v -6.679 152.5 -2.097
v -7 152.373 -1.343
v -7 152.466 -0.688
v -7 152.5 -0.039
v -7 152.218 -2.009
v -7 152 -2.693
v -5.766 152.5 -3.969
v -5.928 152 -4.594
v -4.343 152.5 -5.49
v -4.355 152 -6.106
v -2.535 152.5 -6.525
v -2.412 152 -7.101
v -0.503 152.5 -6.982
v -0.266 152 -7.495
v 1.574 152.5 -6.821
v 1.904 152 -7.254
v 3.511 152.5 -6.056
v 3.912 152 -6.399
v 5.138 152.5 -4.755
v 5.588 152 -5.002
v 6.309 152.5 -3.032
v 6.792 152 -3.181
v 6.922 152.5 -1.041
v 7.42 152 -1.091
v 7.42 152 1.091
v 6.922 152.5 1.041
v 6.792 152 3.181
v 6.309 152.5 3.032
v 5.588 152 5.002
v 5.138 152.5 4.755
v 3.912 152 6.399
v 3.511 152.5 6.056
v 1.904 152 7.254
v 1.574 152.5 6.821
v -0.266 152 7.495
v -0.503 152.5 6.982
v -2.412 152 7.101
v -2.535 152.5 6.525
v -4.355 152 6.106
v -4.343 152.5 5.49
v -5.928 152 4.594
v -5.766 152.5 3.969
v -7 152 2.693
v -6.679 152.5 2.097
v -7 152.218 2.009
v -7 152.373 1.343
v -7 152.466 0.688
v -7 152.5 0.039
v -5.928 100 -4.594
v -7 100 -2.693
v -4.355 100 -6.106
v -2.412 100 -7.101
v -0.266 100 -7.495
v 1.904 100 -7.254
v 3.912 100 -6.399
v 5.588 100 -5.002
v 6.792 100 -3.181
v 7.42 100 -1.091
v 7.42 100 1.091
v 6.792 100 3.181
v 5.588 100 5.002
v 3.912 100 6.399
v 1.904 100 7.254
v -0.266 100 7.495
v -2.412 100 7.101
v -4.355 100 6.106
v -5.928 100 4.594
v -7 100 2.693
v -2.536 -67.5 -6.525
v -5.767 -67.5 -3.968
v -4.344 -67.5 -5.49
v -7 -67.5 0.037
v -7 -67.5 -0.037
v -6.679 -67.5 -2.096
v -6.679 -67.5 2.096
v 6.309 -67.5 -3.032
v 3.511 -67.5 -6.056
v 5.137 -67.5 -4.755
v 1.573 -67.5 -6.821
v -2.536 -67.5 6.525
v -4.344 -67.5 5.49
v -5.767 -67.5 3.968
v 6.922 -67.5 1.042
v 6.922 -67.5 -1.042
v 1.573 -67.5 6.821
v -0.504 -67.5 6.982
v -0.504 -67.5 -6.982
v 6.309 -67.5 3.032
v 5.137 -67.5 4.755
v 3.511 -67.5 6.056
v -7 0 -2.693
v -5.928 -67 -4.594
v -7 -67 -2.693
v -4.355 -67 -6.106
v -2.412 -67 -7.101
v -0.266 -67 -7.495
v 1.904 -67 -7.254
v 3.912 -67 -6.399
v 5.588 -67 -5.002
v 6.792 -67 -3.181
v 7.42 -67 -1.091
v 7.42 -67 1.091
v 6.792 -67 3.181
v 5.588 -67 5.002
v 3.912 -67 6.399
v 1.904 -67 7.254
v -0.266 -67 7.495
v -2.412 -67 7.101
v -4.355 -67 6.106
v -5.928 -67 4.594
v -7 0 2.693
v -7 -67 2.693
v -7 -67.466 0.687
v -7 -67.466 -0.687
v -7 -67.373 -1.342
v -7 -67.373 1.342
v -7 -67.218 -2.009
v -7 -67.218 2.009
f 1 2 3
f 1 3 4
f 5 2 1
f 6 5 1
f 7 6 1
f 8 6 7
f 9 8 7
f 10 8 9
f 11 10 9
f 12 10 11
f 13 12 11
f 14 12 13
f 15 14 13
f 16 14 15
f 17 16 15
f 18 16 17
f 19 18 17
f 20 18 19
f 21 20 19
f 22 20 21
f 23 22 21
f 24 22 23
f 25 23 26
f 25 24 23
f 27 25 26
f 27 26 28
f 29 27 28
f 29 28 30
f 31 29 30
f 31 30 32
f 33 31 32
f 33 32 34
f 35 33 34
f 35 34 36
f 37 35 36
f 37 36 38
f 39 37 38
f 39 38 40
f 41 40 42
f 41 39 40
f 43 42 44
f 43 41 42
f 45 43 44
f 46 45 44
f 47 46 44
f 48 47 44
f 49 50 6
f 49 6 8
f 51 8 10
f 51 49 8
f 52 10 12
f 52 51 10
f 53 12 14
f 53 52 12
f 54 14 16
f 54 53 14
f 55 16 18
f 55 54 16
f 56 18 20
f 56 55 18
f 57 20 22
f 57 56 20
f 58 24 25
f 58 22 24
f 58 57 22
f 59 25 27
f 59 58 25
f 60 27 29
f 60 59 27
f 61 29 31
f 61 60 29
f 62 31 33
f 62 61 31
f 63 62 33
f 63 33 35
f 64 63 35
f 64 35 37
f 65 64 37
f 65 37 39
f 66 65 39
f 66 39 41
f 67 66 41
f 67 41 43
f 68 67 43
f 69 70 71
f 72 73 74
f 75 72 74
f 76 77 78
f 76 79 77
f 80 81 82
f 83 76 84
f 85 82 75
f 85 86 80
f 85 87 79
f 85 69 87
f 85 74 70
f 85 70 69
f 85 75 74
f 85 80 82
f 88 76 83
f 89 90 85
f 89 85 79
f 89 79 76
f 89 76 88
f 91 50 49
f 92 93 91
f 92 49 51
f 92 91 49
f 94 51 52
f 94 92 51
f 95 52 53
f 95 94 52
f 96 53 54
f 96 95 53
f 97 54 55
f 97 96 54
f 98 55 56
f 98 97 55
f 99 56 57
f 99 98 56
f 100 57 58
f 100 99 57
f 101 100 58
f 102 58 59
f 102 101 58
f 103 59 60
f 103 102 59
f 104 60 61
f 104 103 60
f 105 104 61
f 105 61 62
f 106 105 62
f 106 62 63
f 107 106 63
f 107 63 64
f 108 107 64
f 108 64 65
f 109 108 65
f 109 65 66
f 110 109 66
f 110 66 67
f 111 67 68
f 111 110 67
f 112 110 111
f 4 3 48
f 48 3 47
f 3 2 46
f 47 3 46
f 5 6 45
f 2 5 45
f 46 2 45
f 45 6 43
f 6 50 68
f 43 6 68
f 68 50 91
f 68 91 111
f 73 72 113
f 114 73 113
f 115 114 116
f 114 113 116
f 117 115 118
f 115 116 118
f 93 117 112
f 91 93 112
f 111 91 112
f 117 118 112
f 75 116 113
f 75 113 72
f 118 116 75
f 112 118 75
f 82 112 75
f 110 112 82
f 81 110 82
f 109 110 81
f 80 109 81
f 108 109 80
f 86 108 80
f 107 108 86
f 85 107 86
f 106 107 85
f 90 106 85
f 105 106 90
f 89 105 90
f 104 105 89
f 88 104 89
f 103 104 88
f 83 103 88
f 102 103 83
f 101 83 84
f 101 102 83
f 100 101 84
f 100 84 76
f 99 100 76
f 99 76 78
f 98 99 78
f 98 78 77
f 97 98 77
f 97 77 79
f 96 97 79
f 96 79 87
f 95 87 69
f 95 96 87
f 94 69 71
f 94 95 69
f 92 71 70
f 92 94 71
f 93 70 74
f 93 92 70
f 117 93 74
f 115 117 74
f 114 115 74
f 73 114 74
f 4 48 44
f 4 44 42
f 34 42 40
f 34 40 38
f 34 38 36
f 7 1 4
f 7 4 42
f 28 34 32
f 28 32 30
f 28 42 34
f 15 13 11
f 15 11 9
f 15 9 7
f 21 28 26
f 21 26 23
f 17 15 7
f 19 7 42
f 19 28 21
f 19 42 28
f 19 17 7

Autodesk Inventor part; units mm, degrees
sketch "Sketch1" plane through (0, 0, 0) normal (0, 1, 0) x (-1, 0, 0)
  circle A0 centre (0, 0) radius 7.5
  dimension "d0" = 15
extrude "Extrusion1" add sketch "Sketch1" along normal blind 100
ref_plane "Work Plane1" through (0, 72.5, 0) normal (0, 1, 0) x (1, 0, 0)
sketch "Sketch2" plane through (0, 72.5, 0) normal (0, 1, 0) x (1, 0, 0)
  circle A0 centre (0, 0) radius 7.5 projected
ref_plane "Work Plane2" through (-7.5, 0, 0) normal (1, 0, 0) x (0, 1, 0)
ref_plane "Work Plane3" through (0, 27.5, 0) normal (0, -1, 0) x (1, 0, 0)
sketch "Sketch3" plane through (-7.5, 0, 0) normal (1, 0, 0) x (0, 1, 0)
  line L0 (27.5, -10.5) -> (27.5, 10.5) projected
  line L1 (72.5, 10.5) -> (72.5, -10.5) projected
  line L2 (0, -7.5) -> (0, 7.5) projected
  line L3 (27.5, -3) -> (0, -3)
  line L4 (0, -3) -> (0, 3)
  line L5 (0, 3) -> (27.5, 3)
  line L6 (27.5, 3) -> (27.5, -3)
  line L7 (100, -7.5) -> (100, 7.5) projected
  line L8 (72.5, -3) -> (100, -3)
  line L9 (100, -3) -> (100, 3)
  line L10 (100, 3) -> (72.5, 3)
  line L11 (72.5, 3) -> (72.5, -3)
  line L12 (27.5, -3) -> (72.5, -3)
  line L13 (72.5, -3) -> (72.5, 3)
  line L14 (72.5, 3) -> (27.5, 3)
  line L15 (27.5, 3) -> (27.5, -3)
  point P0 (0, 0)
extrude "Extrusion3" cut sketch "Sketch3" along normal blind 0.5 contours L0 L14 L1 L12 | L1 L10 L7 L8
extrude "Extrusion2" [suppressed]
chamfer "Chamfer1" [suppressed]
sketch "Sketch4" plane through (0, 0, 0) normal (0, -1, 0) x (1, 0, 0)
  circle A0 centre (0, 0) radius 7.5 projected
  circle A1 centre (0, 0) radius 7.5
extrude "Extrusion4" add sketch "Sketch4" along normal blind 67.5
sketch "Sketch5" plane through (0, 100, 0) normal (0, 1, 0) x (1, 0, 0)
  arc A0 (-7, -2.6926) -> (-7, 2.6926) centre (0, 0) ccw projected
  line L0 (-7, 2.6926) -> (-7, -2.6926) projected
  arc A1 (-7, -2.6926) -> (-7, 2.6926) centre (0, 0) ccw projected
  point P0 (-7, 2.6926)
extrude "Extrusion5" add sketch "Sketch5" along normal blind 52.5
sketch "Sketch6" plane through (-7, 0, 0) normal (-1, 0, 0) x (0, 0, 1)
  line L0 (-2.6926, 27.5) -> (-2.6926, 152.5) projected
  line L1 (2.6926, 152.5) -> (2.6926, 27.5) projected
  line L2 (-2.6926, 152.5) -> (2.6926, 152.5) projected
  line L3 (-2.6926, 152.5) -> (2.6926, 152.5) projected
  line L4 (0, 152.5) -> (0, 72.5)
  line L5 (0, 152.5) -> (80, 152.5) construction
  circle A0 centre (0, 72.5) radius 1.25
  circle A1 centre (0, 72.5) radius 0.75 projected
  circle A2 centre (0, 72.5) radius 0.75
  line L6 (-7.5, -67.5) -> (7.5, -67.5) projected
  line L7 (-2.6926, 26.1771) -> (2.6926, 26.1771)
  line L8 (2.6926, 26.1771) -> (2.6926, -67.5)
  line L9 (2.6926, -67.5) -> (-2.6926, -67.5)
  line L10 (-2.6926, -67.5) -> (-2.6926, 26.1771)
  line L11 (2.6926, 27.5) -> (-2.6926, 27.5) projected
  line L12 (2.6926, 26.1771) -> (2.6926, 27.5)
  line L13 (-2.6926, 27.5) -> (-2.6926, 152.5) projected
  line L14 (-2.6926, 26.1771) -> (-2.6926, 27.5)
  point P0 (0, 0)
  dimension "d23" = 80
  dimension "d24" = 90
  dimension "d25" = 2.5
  dimension "d26" = 1.5
extrude "Extrusion6" [suppressed]
chamfer "Chamfer3" [suppressed]
extrude "Extrusion7" cut sketch "Sketch6" along normal blind 0.5 contours L11 L12 L7 L14 | L7 L8 L6 L10
chamfer "Chamfer4" distance 0.5 angle 45 2 edges at (7.5, 152.5, 0) (7.5, -67.5, 0)
properties part number "wał_uzębienia" material "Stainless Steel"
